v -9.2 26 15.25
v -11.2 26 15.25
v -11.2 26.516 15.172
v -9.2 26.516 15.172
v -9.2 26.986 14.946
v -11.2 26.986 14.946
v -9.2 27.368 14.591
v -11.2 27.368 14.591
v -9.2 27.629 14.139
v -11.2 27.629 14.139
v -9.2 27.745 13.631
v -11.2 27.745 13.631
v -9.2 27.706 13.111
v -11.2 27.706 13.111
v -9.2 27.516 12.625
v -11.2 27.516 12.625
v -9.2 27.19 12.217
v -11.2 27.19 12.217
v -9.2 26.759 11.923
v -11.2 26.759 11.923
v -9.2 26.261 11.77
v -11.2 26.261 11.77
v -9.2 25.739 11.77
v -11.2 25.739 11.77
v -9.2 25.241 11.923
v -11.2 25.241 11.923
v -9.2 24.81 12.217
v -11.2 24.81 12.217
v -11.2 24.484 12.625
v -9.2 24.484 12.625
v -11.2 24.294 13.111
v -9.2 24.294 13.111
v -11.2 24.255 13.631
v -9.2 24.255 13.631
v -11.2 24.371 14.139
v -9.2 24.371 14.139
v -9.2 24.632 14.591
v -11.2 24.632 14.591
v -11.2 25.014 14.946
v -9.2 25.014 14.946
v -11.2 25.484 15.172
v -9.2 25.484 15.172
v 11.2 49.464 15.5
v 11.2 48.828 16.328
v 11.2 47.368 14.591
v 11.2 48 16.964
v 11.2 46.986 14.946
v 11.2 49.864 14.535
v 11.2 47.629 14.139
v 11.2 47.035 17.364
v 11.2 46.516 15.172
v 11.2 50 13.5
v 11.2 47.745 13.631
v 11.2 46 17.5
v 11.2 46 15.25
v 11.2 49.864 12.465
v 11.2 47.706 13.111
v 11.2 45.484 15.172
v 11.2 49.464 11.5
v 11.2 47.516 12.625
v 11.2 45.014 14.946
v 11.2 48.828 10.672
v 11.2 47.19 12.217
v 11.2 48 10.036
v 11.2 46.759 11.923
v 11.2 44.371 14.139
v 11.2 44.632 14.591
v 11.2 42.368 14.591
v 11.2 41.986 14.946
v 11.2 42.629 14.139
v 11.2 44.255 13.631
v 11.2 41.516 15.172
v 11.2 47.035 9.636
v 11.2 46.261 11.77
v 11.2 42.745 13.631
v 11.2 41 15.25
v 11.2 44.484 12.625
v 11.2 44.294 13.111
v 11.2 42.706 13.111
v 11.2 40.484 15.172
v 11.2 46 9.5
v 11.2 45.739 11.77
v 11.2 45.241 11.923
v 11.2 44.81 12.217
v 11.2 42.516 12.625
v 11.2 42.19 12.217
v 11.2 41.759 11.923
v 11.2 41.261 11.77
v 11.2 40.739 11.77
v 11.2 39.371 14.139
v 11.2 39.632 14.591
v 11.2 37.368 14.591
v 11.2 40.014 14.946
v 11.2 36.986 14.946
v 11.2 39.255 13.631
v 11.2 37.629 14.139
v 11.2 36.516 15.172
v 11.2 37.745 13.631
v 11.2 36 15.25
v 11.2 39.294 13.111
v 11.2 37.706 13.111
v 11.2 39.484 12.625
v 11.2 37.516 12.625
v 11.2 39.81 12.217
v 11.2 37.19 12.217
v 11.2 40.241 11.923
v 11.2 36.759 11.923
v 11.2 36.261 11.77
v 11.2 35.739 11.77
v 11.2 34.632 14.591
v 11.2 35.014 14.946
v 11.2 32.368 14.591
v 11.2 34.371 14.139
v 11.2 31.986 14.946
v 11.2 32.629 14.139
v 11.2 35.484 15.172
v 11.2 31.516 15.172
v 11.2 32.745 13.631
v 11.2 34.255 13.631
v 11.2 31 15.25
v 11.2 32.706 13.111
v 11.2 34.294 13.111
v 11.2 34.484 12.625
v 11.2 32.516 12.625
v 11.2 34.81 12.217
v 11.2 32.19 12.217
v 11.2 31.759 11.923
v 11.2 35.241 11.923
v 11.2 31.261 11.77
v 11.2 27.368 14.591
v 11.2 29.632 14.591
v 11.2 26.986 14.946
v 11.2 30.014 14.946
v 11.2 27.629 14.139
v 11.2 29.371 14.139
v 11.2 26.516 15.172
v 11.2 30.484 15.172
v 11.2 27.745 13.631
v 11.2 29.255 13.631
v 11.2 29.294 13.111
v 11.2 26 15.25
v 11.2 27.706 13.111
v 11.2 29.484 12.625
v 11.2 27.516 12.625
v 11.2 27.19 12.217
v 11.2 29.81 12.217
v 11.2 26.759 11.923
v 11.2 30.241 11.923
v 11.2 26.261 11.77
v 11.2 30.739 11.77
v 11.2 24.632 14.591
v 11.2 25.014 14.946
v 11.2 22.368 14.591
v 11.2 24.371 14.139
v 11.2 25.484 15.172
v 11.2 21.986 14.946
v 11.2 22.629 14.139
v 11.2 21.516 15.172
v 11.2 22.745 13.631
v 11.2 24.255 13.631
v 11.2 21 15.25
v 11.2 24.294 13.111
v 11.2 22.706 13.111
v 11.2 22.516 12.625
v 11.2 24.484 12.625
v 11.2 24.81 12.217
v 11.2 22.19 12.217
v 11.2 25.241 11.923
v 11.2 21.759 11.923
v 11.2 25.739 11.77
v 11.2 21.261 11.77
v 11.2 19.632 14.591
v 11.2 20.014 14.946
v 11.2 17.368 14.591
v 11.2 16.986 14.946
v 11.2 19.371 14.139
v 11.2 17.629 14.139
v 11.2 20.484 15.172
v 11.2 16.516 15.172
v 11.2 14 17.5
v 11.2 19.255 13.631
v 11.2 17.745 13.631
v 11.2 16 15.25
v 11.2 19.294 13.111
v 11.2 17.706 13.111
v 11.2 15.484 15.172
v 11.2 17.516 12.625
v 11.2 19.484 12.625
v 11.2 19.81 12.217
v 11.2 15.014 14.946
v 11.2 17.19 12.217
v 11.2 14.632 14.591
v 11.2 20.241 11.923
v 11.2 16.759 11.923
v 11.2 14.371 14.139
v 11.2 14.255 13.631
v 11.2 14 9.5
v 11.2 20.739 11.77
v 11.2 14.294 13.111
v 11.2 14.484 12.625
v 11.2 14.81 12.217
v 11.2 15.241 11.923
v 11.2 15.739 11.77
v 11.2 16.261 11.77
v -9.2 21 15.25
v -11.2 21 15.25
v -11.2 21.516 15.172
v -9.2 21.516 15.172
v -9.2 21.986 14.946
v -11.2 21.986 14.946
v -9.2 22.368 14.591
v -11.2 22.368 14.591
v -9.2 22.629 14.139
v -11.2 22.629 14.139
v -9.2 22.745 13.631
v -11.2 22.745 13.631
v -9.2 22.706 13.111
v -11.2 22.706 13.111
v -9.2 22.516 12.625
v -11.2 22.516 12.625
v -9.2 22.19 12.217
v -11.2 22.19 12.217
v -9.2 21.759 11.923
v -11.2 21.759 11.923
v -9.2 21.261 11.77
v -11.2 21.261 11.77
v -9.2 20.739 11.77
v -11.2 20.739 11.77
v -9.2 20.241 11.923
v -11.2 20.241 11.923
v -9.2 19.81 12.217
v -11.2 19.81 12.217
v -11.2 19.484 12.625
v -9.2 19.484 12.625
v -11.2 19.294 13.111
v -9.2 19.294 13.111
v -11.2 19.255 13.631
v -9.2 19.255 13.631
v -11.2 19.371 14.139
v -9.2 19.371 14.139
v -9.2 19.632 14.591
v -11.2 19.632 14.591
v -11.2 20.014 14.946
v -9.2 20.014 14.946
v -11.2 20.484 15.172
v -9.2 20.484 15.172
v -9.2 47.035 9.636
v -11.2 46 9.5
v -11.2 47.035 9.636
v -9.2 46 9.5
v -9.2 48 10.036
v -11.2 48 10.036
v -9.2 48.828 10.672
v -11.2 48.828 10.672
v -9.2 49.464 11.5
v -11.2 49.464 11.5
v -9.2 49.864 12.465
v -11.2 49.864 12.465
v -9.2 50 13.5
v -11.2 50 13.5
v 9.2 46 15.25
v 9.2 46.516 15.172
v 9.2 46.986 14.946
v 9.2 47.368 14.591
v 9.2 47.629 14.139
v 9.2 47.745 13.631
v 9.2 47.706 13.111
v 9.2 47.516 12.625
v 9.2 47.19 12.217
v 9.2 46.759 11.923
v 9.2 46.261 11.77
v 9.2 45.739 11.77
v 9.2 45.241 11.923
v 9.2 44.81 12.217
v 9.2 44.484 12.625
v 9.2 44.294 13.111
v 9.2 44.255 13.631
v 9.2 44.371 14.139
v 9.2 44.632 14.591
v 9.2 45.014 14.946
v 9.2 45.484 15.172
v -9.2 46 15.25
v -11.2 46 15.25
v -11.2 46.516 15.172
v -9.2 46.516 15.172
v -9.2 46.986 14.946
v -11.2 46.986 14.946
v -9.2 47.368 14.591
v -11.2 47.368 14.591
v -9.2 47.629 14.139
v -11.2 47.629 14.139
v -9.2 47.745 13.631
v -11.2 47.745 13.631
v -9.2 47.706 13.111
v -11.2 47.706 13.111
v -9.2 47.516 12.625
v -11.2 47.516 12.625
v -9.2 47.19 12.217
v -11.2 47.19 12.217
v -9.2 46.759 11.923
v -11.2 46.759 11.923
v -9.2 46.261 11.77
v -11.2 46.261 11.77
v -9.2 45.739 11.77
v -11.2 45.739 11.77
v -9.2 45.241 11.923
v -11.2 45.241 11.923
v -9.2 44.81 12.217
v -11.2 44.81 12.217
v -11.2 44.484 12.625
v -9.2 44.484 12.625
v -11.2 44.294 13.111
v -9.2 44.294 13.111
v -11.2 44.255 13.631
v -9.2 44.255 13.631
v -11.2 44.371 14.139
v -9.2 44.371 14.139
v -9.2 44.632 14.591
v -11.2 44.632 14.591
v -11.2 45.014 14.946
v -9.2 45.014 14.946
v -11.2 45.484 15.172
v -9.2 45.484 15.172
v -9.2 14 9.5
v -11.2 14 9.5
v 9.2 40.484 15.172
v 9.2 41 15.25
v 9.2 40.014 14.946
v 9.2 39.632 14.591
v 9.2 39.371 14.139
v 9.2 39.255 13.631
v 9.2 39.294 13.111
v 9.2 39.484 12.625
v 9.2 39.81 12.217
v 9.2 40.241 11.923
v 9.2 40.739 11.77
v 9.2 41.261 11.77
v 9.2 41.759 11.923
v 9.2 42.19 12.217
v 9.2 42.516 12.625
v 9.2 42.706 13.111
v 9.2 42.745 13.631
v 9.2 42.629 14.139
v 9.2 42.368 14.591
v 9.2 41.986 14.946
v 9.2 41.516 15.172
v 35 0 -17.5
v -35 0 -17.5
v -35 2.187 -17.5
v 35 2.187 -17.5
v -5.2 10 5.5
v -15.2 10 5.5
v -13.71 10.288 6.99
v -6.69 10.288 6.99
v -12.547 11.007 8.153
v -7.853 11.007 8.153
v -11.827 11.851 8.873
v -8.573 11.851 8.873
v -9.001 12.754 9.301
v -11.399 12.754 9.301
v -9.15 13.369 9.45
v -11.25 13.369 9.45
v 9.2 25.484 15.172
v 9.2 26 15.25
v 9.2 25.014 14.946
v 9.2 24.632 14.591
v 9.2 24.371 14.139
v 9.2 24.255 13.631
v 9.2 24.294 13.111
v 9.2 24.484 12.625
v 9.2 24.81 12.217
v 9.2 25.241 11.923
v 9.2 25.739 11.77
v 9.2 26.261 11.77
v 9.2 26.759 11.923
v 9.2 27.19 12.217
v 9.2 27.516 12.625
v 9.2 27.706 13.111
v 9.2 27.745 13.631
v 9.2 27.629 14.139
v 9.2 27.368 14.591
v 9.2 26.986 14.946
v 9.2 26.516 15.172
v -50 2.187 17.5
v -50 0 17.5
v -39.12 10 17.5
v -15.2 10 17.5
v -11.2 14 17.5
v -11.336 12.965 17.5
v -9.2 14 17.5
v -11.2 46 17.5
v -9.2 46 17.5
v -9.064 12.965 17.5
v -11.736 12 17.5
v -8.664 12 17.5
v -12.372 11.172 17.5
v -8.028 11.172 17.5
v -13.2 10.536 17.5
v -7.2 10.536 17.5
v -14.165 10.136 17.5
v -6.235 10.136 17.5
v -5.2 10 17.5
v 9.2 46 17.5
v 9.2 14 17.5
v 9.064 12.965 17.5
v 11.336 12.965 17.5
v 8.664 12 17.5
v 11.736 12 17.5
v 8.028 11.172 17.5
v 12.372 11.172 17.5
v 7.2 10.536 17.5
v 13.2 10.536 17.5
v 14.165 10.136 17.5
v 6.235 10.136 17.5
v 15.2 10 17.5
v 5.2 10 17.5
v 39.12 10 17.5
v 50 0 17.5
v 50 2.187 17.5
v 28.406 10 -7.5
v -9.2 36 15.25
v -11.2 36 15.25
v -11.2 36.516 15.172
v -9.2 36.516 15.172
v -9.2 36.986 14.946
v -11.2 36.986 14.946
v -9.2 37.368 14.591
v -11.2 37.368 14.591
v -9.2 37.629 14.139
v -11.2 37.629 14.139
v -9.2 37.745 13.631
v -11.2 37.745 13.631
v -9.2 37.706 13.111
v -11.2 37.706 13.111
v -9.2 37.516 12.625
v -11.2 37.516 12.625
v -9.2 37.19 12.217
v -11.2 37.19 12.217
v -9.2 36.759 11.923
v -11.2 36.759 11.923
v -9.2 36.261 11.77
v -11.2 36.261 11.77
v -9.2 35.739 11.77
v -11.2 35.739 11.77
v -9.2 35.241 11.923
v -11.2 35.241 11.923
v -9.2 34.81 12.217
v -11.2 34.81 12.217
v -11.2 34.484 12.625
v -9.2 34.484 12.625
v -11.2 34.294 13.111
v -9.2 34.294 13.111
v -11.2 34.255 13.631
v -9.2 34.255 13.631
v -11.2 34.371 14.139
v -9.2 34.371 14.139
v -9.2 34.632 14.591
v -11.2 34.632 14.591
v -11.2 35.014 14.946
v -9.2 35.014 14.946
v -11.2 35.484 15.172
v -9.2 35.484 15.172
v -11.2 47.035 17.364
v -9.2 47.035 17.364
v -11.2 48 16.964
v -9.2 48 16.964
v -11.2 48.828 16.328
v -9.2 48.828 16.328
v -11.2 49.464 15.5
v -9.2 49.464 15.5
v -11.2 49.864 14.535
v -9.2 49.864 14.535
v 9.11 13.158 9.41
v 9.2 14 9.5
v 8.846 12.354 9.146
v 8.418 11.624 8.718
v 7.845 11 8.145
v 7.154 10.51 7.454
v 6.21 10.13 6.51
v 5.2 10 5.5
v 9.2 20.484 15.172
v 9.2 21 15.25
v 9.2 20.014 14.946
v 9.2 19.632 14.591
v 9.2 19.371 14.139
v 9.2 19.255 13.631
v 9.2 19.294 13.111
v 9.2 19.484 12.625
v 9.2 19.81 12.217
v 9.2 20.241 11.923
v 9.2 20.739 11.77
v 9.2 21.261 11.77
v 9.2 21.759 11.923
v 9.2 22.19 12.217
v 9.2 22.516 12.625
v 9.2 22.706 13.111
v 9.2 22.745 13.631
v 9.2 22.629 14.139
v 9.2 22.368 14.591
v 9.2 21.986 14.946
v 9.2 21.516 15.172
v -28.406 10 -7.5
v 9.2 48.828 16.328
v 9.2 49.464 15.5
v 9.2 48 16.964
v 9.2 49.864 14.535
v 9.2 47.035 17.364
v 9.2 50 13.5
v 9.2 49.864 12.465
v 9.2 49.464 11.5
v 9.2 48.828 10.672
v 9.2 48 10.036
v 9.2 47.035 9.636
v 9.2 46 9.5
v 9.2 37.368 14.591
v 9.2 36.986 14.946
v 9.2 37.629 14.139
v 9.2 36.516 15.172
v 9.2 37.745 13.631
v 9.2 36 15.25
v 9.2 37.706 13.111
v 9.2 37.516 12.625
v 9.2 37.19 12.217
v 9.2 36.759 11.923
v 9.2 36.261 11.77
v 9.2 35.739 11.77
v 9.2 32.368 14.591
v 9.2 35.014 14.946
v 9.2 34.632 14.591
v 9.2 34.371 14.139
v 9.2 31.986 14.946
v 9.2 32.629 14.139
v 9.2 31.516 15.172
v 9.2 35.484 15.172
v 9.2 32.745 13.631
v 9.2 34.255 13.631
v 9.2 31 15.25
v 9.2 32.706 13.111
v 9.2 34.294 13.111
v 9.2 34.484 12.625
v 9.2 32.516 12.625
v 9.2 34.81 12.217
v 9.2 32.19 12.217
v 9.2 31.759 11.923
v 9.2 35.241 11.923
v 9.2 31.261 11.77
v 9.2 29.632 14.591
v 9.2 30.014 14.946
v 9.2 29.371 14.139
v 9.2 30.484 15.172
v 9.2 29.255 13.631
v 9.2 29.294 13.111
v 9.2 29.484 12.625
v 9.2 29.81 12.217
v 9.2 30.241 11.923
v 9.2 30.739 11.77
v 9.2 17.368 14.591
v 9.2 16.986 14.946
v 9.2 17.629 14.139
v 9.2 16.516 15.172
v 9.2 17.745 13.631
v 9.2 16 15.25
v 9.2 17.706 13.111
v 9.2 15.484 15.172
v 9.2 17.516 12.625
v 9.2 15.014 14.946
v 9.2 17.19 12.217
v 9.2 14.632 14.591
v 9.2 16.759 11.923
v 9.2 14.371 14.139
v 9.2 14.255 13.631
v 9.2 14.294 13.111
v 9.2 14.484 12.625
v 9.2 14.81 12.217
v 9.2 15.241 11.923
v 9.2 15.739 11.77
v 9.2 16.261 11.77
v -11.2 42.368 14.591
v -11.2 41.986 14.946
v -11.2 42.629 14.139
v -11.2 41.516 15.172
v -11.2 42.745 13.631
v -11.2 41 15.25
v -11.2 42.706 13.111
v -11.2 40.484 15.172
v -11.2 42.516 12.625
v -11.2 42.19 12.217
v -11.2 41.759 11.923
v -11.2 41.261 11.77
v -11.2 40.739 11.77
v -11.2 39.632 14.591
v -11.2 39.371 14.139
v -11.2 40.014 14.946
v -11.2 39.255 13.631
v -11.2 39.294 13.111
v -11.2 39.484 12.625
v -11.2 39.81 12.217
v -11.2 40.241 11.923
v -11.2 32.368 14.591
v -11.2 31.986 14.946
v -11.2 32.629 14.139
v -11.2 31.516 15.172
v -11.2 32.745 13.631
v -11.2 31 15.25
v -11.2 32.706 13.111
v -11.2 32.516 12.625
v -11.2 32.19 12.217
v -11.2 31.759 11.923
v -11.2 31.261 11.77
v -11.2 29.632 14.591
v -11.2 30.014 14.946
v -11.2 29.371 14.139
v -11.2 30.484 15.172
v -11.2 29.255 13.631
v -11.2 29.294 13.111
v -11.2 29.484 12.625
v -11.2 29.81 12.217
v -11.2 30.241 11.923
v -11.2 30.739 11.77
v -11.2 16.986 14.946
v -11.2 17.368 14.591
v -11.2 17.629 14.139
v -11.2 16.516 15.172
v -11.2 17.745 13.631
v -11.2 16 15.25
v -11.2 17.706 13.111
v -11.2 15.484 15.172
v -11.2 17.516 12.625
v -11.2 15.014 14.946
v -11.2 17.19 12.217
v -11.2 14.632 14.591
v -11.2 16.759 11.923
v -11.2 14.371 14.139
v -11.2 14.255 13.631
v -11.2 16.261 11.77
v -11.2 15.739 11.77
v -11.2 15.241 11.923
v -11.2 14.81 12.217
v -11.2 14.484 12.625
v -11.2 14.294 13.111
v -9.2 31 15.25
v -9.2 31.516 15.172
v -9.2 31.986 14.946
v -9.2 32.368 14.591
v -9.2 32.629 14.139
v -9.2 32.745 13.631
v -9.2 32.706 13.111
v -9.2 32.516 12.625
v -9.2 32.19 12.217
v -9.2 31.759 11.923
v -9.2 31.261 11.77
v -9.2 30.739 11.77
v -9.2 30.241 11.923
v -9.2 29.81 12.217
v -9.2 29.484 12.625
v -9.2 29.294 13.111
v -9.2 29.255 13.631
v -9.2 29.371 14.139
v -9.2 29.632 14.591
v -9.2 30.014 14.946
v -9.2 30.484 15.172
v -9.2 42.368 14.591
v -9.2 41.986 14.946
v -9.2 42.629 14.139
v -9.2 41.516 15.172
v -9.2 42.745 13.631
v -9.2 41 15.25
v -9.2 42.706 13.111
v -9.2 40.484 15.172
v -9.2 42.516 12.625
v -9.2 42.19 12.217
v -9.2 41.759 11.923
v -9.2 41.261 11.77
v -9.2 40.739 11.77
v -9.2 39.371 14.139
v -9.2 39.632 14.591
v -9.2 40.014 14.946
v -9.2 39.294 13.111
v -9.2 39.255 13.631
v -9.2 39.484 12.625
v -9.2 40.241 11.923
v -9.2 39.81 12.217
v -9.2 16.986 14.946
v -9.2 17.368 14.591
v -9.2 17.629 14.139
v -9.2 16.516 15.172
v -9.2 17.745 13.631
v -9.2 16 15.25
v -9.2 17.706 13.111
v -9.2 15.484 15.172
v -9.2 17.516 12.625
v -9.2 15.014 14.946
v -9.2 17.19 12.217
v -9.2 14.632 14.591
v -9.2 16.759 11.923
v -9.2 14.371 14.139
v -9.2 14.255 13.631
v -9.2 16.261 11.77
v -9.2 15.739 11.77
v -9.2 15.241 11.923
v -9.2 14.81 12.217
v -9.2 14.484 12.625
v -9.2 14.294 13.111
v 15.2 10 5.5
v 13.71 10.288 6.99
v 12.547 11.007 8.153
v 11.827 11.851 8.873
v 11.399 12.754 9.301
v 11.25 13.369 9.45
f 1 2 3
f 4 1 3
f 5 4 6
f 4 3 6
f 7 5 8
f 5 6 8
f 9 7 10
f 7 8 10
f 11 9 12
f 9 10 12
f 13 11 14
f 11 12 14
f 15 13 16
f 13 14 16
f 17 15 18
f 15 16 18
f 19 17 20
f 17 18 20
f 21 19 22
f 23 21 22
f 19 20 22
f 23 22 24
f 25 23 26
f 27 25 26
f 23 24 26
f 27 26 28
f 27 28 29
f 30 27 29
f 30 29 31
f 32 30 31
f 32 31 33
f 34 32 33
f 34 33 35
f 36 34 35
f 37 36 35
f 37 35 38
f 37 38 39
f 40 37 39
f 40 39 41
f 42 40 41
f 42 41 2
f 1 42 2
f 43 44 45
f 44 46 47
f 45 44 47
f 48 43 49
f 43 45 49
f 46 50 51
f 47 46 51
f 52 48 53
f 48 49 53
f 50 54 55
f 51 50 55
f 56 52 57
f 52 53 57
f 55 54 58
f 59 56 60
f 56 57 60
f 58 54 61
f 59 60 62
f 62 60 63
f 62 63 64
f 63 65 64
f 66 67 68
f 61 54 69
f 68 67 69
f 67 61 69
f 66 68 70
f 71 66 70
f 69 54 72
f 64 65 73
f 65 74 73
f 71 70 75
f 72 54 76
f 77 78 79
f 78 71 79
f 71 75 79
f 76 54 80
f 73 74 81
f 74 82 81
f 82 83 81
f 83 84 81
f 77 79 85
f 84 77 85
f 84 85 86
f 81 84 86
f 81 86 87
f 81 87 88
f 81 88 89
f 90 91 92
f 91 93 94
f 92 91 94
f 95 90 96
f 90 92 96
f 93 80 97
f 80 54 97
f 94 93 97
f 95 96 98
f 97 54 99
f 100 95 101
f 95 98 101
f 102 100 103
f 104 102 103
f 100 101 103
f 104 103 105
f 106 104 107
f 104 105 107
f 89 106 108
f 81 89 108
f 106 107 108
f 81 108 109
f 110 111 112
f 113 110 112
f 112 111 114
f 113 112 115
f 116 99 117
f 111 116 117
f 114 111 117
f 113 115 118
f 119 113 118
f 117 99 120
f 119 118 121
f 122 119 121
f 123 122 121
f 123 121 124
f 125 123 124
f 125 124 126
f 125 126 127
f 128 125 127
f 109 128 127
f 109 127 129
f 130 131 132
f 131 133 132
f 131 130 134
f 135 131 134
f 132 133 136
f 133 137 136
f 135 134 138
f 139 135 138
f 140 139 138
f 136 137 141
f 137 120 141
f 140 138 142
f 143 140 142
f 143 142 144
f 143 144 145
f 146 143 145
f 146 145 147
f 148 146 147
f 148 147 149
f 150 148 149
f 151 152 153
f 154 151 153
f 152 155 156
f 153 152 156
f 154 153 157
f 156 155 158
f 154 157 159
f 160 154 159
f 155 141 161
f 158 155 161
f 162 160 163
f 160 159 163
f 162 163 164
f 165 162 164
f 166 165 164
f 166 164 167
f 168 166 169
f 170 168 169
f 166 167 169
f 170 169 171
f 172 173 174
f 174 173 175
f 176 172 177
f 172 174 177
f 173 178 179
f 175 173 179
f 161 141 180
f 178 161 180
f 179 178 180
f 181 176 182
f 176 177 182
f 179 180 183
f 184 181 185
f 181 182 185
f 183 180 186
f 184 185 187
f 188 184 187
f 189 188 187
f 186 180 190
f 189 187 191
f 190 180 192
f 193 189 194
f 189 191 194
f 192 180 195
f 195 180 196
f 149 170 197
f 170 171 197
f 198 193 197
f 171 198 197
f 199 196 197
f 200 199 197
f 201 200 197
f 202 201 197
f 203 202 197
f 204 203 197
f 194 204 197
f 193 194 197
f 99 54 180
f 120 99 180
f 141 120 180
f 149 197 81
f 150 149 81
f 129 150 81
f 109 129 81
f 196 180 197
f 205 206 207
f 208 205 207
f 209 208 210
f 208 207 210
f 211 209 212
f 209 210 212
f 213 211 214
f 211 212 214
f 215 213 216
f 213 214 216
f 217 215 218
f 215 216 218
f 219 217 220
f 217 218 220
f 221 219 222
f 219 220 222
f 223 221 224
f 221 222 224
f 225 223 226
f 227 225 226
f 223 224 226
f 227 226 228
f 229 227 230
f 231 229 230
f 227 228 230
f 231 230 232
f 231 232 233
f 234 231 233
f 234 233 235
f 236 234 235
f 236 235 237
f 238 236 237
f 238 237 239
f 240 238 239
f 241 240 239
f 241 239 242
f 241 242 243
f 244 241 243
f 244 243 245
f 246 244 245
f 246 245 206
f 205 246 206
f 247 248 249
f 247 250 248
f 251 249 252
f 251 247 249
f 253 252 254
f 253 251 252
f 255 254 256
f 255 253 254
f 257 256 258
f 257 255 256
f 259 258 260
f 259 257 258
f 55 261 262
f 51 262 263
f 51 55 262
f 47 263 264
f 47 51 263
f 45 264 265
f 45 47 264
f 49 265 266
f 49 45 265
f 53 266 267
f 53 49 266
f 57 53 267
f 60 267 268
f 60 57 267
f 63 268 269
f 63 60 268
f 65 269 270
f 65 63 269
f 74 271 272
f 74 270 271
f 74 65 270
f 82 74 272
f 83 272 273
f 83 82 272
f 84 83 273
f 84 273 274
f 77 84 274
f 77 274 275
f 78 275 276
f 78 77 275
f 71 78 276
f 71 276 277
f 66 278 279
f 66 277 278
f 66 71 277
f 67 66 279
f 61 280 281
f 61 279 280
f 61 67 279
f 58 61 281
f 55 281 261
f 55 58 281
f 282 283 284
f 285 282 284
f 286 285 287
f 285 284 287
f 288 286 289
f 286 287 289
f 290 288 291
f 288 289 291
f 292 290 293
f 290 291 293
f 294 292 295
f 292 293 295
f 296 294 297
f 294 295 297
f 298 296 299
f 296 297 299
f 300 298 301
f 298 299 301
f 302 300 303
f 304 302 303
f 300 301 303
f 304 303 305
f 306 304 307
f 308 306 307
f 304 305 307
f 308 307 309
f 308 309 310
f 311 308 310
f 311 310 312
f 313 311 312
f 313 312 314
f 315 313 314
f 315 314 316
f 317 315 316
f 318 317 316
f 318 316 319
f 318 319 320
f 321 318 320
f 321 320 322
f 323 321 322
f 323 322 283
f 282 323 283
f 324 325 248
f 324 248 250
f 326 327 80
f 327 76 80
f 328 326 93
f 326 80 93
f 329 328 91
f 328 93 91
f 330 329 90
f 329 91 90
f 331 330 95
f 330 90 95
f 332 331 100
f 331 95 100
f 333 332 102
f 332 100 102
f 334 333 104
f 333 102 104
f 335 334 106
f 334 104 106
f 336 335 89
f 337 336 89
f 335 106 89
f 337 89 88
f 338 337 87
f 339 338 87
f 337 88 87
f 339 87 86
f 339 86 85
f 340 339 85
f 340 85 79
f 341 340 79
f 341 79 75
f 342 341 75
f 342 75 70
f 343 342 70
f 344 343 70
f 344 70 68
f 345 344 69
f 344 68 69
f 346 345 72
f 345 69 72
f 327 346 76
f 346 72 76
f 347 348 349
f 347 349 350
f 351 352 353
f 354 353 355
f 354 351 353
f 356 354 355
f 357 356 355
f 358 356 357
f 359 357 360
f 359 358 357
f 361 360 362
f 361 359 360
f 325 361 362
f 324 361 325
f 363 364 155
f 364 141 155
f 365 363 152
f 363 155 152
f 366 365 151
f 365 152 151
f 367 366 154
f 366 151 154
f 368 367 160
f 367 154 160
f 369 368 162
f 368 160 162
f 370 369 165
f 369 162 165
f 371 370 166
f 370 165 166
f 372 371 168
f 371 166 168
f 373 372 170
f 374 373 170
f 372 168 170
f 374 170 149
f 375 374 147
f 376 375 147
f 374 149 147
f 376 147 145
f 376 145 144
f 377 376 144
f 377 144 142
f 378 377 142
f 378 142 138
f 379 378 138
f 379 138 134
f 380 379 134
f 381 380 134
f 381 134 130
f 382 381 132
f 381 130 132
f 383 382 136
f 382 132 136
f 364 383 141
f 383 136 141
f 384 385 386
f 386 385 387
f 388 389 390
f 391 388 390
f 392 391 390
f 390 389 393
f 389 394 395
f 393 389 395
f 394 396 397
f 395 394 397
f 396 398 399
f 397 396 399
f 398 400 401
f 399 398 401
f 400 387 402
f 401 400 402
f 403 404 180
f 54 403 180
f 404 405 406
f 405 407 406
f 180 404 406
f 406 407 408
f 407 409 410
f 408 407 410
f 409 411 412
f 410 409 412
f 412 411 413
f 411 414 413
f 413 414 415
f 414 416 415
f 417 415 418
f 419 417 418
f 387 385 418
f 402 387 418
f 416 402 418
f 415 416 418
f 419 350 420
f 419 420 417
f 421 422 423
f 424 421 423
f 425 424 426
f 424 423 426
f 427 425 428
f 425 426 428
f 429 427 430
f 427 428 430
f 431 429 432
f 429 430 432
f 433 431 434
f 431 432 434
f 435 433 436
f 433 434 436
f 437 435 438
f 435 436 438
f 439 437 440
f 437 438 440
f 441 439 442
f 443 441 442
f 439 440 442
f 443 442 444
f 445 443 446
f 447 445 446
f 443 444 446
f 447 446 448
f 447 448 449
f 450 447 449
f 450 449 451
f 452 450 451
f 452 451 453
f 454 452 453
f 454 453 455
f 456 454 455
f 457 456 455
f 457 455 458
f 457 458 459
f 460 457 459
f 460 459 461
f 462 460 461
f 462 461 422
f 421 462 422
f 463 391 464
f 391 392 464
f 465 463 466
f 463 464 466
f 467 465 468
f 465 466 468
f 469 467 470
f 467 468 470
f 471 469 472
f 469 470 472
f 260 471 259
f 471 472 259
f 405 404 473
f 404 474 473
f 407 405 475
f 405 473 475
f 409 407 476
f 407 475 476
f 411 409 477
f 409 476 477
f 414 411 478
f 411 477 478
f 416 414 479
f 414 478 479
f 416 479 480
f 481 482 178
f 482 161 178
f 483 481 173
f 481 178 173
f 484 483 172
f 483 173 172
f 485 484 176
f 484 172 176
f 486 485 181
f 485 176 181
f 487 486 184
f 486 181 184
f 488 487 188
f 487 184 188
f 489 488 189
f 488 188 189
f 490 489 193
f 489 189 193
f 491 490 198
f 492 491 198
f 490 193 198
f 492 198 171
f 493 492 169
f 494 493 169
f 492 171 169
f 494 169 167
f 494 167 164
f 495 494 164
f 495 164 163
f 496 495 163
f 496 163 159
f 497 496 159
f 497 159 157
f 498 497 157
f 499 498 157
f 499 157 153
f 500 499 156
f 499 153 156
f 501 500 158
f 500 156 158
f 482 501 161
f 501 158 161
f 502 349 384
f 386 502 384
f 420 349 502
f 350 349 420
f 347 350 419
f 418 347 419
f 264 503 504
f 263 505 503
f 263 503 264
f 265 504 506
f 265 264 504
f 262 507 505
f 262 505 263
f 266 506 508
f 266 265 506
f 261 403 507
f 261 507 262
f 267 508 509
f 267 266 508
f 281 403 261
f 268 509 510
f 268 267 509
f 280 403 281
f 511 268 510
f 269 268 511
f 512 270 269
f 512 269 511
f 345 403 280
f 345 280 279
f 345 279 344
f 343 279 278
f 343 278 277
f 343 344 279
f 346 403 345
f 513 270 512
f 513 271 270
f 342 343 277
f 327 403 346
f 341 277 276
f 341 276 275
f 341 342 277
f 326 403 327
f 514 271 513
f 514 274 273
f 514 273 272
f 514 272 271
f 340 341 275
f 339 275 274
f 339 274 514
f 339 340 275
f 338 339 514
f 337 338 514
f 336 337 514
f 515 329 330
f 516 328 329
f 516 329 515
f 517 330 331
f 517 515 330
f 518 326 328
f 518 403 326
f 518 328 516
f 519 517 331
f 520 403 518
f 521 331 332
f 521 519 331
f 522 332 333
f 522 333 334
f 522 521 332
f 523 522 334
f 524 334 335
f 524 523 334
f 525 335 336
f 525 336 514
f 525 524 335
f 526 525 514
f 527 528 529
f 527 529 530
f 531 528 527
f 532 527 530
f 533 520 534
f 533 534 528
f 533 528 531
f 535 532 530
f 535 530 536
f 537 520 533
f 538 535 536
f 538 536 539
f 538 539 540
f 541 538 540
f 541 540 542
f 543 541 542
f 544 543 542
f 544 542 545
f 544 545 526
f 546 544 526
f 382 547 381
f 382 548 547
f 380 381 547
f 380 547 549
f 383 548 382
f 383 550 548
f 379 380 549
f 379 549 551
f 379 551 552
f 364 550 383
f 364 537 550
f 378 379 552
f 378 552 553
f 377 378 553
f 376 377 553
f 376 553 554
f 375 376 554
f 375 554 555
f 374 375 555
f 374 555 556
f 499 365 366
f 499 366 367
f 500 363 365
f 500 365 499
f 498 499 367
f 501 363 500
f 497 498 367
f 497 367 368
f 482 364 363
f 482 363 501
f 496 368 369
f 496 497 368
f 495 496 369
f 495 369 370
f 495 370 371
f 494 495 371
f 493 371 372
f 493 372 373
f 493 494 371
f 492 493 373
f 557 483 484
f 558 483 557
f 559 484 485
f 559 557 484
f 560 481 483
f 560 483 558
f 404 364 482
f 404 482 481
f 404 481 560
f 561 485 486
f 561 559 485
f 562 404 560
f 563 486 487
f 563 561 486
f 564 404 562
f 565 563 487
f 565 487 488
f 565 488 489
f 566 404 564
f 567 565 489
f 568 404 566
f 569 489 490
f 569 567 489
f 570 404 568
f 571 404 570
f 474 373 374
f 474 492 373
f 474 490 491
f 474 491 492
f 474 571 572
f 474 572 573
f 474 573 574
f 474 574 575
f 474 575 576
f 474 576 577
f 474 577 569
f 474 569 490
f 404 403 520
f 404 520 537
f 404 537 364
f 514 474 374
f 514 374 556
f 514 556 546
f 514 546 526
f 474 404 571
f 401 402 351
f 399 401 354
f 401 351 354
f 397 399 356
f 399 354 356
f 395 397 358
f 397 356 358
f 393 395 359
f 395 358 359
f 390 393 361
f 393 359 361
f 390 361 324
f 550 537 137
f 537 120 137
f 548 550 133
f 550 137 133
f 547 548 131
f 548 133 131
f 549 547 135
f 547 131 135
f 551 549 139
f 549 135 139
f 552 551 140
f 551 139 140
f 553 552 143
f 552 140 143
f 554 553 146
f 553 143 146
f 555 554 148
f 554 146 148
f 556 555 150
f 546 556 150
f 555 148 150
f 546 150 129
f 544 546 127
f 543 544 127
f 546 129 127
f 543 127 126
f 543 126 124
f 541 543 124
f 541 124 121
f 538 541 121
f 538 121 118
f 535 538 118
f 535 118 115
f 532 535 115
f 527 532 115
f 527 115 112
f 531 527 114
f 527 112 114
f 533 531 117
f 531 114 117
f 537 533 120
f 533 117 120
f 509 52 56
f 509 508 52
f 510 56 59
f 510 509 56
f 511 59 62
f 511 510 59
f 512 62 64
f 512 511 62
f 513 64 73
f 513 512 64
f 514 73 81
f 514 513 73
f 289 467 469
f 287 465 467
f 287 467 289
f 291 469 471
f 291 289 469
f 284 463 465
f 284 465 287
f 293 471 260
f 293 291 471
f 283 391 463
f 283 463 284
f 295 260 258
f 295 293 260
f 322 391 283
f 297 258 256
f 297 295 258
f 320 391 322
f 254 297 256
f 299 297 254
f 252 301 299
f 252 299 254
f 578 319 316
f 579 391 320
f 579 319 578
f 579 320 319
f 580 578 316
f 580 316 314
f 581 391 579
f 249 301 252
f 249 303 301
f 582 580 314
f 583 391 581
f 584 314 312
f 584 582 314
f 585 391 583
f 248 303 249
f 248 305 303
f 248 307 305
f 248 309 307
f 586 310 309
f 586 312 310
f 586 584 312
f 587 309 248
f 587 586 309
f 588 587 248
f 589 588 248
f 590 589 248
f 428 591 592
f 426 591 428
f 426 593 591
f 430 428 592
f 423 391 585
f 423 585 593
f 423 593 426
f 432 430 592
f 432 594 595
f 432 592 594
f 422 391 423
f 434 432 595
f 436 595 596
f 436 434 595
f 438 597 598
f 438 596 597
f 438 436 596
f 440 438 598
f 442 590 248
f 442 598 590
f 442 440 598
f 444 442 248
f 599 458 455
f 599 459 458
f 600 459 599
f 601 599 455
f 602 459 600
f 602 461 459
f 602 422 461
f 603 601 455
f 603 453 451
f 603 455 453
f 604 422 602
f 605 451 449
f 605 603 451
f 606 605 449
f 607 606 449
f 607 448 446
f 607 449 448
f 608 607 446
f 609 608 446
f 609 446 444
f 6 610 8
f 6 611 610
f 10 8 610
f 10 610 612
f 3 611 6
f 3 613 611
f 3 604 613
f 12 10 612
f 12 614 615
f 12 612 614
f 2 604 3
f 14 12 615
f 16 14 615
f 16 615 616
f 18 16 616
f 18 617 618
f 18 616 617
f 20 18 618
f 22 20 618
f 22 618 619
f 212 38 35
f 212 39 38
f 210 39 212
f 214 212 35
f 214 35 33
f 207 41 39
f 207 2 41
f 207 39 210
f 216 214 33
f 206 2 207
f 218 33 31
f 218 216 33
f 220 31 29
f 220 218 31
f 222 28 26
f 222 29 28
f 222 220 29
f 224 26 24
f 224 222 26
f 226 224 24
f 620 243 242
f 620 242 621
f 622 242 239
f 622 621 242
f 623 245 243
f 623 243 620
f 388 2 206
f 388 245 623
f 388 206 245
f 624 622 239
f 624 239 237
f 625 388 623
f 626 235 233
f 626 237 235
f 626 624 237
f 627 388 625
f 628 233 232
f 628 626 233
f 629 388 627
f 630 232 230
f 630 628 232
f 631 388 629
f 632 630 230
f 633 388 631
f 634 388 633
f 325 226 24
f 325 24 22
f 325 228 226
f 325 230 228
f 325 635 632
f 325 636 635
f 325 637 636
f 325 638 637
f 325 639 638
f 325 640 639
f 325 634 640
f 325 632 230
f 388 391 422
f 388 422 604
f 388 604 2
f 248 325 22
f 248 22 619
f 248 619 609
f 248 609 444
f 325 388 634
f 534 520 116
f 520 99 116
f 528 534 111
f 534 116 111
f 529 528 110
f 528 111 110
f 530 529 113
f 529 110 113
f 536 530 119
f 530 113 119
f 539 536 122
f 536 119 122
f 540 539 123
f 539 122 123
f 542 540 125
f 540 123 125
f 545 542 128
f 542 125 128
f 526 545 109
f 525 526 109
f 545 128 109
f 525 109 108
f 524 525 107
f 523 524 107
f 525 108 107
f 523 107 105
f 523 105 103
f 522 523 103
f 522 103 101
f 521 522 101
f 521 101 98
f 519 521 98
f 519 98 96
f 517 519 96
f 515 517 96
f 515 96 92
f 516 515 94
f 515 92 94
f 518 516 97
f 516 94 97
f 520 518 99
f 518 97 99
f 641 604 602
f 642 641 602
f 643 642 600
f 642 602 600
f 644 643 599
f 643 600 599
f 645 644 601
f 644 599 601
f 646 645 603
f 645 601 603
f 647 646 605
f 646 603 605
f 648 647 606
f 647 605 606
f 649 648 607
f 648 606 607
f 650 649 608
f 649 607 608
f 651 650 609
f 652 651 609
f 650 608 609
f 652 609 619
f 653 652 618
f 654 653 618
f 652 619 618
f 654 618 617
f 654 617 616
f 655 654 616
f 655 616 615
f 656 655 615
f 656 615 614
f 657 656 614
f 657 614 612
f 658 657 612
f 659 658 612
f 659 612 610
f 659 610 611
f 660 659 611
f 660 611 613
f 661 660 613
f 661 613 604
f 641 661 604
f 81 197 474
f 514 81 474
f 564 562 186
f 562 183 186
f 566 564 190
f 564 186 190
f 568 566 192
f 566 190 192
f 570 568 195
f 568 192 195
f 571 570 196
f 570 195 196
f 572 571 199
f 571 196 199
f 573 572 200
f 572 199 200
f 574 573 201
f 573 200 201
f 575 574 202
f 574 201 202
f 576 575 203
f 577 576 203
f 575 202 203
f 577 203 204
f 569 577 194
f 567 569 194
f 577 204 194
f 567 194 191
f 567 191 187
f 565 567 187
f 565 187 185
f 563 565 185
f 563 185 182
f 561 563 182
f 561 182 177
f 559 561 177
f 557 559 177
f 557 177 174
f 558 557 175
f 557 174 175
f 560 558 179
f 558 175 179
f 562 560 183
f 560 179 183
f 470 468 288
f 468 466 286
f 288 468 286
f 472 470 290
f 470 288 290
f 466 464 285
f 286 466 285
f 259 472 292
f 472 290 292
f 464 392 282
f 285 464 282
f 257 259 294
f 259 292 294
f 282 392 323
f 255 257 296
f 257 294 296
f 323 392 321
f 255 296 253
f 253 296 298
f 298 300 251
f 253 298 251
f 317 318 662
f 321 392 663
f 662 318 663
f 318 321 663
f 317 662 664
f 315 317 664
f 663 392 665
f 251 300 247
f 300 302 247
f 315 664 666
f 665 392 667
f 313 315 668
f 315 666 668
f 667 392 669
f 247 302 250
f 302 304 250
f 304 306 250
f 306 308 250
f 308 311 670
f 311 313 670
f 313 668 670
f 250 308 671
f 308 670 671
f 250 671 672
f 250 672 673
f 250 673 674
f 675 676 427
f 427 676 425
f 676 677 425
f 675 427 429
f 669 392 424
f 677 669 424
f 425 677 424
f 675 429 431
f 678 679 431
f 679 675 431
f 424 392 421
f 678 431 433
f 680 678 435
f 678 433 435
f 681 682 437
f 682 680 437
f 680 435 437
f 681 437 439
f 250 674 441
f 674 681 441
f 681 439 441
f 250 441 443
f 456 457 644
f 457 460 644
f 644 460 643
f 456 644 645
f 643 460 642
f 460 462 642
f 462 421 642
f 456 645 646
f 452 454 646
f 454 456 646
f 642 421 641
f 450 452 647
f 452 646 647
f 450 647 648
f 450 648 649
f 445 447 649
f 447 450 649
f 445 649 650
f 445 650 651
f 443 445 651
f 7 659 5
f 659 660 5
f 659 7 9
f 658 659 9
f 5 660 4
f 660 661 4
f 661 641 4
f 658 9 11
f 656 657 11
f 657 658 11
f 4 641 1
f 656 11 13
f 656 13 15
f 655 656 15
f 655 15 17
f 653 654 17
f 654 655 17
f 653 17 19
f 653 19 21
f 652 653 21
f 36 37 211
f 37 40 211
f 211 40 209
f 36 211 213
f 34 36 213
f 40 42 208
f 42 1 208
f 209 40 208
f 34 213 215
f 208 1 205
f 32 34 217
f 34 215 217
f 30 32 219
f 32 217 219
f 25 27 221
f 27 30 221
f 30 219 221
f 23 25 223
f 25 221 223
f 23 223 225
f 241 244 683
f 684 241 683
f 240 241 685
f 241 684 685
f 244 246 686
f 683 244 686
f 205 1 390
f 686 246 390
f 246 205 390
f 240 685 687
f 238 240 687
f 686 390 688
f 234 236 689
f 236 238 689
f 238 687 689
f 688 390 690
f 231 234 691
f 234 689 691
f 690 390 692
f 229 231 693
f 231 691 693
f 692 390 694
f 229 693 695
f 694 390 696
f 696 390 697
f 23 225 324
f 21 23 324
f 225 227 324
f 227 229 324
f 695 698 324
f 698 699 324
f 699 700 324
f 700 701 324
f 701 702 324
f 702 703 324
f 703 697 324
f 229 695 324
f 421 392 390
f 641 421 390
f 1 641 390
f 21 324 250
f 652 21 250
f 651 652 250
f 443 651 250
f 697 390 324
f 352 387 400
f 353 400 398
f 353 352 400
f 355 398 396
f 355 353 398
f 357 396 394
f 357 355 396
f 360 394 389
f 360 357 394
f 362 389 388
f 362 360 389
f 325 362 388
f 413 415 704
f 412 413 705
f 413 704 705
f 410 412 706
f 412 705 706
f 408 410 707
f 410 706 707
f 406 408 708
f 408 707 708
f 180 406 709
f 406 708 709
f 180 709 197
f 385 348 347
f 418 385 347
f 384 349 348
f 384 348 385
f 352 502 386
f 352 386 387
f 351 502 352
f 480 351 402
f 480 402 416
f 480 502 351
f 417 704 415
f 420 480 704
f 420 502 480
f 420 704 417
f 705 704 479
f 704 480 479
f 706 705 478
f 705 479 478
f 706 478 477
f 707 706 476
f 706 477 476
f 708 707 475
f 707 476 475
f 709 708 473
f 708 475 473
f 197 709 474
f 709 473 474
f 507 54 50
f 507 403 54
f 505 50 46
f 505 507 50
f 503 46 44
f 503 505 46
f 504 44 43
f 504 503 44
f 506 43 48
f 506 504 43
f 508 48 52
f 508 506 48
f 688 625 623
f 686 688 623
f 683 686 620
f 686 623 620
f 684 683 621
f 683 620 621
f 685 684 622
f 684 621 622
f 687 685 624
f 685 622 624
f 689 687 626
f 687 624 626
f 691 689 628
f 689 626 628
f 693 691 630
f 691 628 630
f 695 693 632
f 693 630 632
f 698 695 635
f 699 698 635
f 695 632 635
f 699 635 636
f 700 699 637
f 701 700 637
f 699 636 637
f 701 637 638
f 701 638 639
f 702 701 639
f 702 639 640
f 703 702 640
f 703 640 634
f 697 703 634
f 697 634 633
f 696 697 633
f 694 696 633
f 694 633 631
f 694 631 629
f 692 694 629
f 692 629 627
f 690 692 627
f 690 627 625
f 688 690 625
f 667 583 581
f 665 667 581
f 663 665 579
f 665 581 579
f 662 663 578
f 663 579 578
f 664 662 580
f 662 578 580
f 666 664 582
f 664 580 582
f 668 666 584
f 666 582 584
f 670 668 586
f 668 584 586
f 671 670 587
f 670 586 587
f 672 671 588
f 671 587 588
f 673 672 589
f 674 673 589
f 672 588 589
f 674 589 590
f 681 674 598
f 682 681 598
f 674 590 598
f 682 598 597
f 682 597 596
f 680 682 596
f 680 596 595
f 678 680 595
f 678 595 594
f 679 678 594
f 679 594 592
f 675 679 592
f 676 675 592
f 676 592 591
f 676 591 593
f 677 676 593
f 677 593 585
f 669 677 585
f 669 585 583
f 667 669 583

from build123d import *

# Parameters (mm, degrees)
SKETCH1_W               = 100
SKETCH1_H               = 35
BOSS_EXTRUDE1_DEPTH     = 10
CUT_EXTRUDE1_DEPTH      = 54.909646632
CHAMFER1_SIZE           = 10
CHAMFER1_SIZE2          = 7.812856265
SKETCH3_W               = 2
SKETCH3_H               = 8
BOSS_EXTRUDE2_DEPTH     = 40
FILLET1_R               = 4
SKETCH4_R               = 1.75
CUT_EXTRUDE2_DEPTH      = 81.942510463
LPATTERN1_COUNT         = 7
LPATTERN1_PITCH         = 5
MIRROR1_COPY_1_SKETCH_R = 1.75
MIRROR1_COPY_1_DEPTH    = 81.942510463
MIRROR1_COPY_2_SKETCH_R = 1.75
MIRROR1_COPY_2_DEPTH    = 81.942510463
MIRROR1_COPY_3_SKETCH_R = 1.75
MIRROR1_COPY_3_DEPTH    = 81.942510463
MIRROR1_COPY_4_SKETCH_R = 1.75
MIRROR1_COPY_4_DEPTH    = 81.942510463
MIRROR1_COPY_5_SKETCH_R = 1.75
MIRROR1_COPY_5_DEPTH    = 81.942510463
MIRROR1_COPY_6_SKETCH_R = 1.75
MIRROR1_COPY_6_DEPTH    = 81.942510463
FILLET1_OF_MIRROR1_R    = 4
FILLET2_R               = 4


with BuildPart() as part:
    # Sketch1 → Boss-Extrude1 (new body)
    with BuildSketch(Plane(origin=(0, 0, 0), x_dir=(1, 0, 0), z_dir=(0, 1, 0))):
        Rectangle(SKETCH1_W, SKETCH1_H)
    extrude(amount=BOSS_EXTRUDE1_DEPTH)

    # Sketch2 → Cut-Extrude1 (cut, through all)
    with BuildSketch(Plane(origin=(0, 10, 0), x_dir=(1, 0, 0), z_dir=(0, 1, 0))):
        Polygon((-50, 17.5), (-35, 17.5), (-50, -17.5), align=None)
        Polygon((50, 17.5), (35, 17.5), (50, -17.5), align=None)
    extrude(amount=-CUT_EXTRUDE1_DEPTH, mode=Mode.SUBTRACT)

    # Chamfer1
    chamfer1_edges = [part.edges().sort_by_distance(p)[0] for p in [
        (0, 10, -17.5),
        (-42.5, 10, 0),
        (42.5, 10, 0),
    ]]
    chamfer1_side = [part.faces().sort_by_distance(p)[0] for p in [
        (0, 10, 1.029411765),
    ]]
    chamfer(chamfer1_edges, length=CHAMFER1_SIZE, length2=CHAMFER1_SIZE2, reference=chamfer1_side[0])

    # Sketch3 → Boss-Extrude2 (add)
    with BuildSketch(Plane(origin=(0, 10, 0), x_dir=(1, 0, 0), z_dir=(0, 1, 0))):
        with Locations((-10.2, -13.5)):
            Rectangle(SKETCH3_W, SKETCH3_H)
    boss_extrude2 = extrude(amount=BOSS_EXTRUDE2_DEPTH)

    # Fillet1
    fillet1_edges = [part.edges().sort_by_distance(p)[0] for p in [
        (-10.2, 50, 9.5),
        (-10.2, 50, 17.5),
    ]]
    fillet(fillet1_edges, radius=FILLET1_R - 0.0001)  # a hair under: the kernel refuses the full size

    # Sketch4 → Cut-Extrude2 (cut, through all)
    with BuildSketch(Plane.ZY.offset(11.2)):
        with Locations((13.5, 46)):
            Circle(SKETCH4_R)
    cut_extrude2 = extrude(amount=-CUT_EXTRUDE2_DEPTH, mode=Mode.SUBTRACT)

    # LPattern1: Cut-Extrude2 ×7
    with Locations(*[(0, -i * LPATTERN1_PITCH, 0) for i in range(1, LPATTERN1_COUNT)]):
        add(cut_extrude2, mode=Mode.SUBTRACT)

    # Mirror1: Boss-Extrude2, Cut-Extrude2 across plane
    add(boss_extrude2.mirror(Plane(origin=(0, 0, 0), x_dir=(0, 0, 1), z_dir=(1, 0, 0))))
    add(cut_extrude2.mirror(Plane(origin=(0, 0, 0), x_dir=(0, 0, 1), z_dir=(1, 0, 0))), mode=Mode.SUBTRACT)

    # Mirror1 copy 1 sketch → Mirror1 copy 1 (cut, through all)
    with BuildSketch(Plane(origin=(11.2, -5, 0), x_dir=(0, 0, 1), z_dir=(1, 0, 0))):
        with Locations((13.5, -46)):
            Circle(MIRROR1_COPY_1_SKETCH_R)
    extrude(amount=-MIRROR1_COPY_1_DEPTH, mode=Mode.SUBTRACT)

    # Mirror1 copy 2 sketch → Mirror1 copy 2 (cut, through all)
    with BuildSketch(Plane(origin=(11.2, -10, 0), x_dir=(0, 0, 1), z_dir=(1, 0, 0))):
        with Locations((13.5, -46)):
            Circle(MIRROR1_COPY_2_SKETCH_R)
    extrude(amount=-MIRROR1_COPY_2_DEPTH, mode=Mode.SUBTRACT)

    # Mirror1 copy 3 sketch → Mirror1 copy 3 (cut, through all)
    with BuildSketch(Plane(origin=(11.2, -15, 0), x_dir=(0, 0, 1), z_dir=(1, 0, 0))):
        with Locations((13.5, -46)):
            Circle(MIRROR1_COPY_3_SKETCH_R)
    extrude(amount=-MIRROR1_COPY_3_DEPTH, mode=Mode.SUBTRACT)

    # Mirror1 copy 4 sketch → Mirror1 copy 4 (cut, through all)
    with BuildSketch(Plane(origin=(11.2, -20, 0), x_dir=(0, 0, 1), z_dir=(1, 0, 0))):
        with Locations((13.5, -46)):
            Circle(MIRROR1_COPY_4_SKETCH_R)
    extrude(amount=-MIRROR1_COPY_4_DEPTH, mode=Mode.SUBTRACT)

    # Mirror1 copy 5 sketch → Mirror1 copy 5 (cut, through all)
    with BuildSketch(Plane(origin=(11.2, -25, 0), x_dir=(0, 0, 1), z_dir=(1, 0, 0))):
        with Locations((13.5, -46)):
            Circle(MIRROR1_COPY_5_SKETCH_R)
    extrude(amount=-MIRROR1_COPY_5_DEPTH, mode=Mode.SUBTRACT)

    # Mirror1 copy 6 sketch → Mirror1 copy 6 (cut, through all)
    with BuildSketch(Plane(origin=(11.2, -30, 0), x_dir=(0, 0, 1), z_dir=(1, 0, 0))):
        with Locations((13.5, -46)):
            Circle(MIRROR1_COPY_6_SKETCH_R)
    extrude(amount=-MIRROR1_COPY_6_DEPTH, mode=Mode.SUBTRACT)

    # Fillet1 of Mirror1
    fillet1_of_mirror1_edges = [part.edges().sort_by_distance(p)[0] for p in [
        (10.2, 50, 9.5),
        (10.2, 50, 17.5),
    ]]
    fillet(fillet1_of_mirror1_edges, radius=FILLET1_OF_MIRROR1_R - 0.0001)  # a hair under: the kernel refuses the full size

    # Fillet2
    fillet2_edges = [part.edges().sort_by_distance(p)[0] for p in [
        (9.2, 10, 13.5),
        (10.2, 10, 9.5),
        (11.2, 10, 13.5),
        (-9.2, 10, 13.5),
        (-10.2, 10, 9.5),
        (-11.2, 10, 13.5),
    ]]
    fillet(fillet2_edges, radius=FILLET2_R)


solid = part.part
